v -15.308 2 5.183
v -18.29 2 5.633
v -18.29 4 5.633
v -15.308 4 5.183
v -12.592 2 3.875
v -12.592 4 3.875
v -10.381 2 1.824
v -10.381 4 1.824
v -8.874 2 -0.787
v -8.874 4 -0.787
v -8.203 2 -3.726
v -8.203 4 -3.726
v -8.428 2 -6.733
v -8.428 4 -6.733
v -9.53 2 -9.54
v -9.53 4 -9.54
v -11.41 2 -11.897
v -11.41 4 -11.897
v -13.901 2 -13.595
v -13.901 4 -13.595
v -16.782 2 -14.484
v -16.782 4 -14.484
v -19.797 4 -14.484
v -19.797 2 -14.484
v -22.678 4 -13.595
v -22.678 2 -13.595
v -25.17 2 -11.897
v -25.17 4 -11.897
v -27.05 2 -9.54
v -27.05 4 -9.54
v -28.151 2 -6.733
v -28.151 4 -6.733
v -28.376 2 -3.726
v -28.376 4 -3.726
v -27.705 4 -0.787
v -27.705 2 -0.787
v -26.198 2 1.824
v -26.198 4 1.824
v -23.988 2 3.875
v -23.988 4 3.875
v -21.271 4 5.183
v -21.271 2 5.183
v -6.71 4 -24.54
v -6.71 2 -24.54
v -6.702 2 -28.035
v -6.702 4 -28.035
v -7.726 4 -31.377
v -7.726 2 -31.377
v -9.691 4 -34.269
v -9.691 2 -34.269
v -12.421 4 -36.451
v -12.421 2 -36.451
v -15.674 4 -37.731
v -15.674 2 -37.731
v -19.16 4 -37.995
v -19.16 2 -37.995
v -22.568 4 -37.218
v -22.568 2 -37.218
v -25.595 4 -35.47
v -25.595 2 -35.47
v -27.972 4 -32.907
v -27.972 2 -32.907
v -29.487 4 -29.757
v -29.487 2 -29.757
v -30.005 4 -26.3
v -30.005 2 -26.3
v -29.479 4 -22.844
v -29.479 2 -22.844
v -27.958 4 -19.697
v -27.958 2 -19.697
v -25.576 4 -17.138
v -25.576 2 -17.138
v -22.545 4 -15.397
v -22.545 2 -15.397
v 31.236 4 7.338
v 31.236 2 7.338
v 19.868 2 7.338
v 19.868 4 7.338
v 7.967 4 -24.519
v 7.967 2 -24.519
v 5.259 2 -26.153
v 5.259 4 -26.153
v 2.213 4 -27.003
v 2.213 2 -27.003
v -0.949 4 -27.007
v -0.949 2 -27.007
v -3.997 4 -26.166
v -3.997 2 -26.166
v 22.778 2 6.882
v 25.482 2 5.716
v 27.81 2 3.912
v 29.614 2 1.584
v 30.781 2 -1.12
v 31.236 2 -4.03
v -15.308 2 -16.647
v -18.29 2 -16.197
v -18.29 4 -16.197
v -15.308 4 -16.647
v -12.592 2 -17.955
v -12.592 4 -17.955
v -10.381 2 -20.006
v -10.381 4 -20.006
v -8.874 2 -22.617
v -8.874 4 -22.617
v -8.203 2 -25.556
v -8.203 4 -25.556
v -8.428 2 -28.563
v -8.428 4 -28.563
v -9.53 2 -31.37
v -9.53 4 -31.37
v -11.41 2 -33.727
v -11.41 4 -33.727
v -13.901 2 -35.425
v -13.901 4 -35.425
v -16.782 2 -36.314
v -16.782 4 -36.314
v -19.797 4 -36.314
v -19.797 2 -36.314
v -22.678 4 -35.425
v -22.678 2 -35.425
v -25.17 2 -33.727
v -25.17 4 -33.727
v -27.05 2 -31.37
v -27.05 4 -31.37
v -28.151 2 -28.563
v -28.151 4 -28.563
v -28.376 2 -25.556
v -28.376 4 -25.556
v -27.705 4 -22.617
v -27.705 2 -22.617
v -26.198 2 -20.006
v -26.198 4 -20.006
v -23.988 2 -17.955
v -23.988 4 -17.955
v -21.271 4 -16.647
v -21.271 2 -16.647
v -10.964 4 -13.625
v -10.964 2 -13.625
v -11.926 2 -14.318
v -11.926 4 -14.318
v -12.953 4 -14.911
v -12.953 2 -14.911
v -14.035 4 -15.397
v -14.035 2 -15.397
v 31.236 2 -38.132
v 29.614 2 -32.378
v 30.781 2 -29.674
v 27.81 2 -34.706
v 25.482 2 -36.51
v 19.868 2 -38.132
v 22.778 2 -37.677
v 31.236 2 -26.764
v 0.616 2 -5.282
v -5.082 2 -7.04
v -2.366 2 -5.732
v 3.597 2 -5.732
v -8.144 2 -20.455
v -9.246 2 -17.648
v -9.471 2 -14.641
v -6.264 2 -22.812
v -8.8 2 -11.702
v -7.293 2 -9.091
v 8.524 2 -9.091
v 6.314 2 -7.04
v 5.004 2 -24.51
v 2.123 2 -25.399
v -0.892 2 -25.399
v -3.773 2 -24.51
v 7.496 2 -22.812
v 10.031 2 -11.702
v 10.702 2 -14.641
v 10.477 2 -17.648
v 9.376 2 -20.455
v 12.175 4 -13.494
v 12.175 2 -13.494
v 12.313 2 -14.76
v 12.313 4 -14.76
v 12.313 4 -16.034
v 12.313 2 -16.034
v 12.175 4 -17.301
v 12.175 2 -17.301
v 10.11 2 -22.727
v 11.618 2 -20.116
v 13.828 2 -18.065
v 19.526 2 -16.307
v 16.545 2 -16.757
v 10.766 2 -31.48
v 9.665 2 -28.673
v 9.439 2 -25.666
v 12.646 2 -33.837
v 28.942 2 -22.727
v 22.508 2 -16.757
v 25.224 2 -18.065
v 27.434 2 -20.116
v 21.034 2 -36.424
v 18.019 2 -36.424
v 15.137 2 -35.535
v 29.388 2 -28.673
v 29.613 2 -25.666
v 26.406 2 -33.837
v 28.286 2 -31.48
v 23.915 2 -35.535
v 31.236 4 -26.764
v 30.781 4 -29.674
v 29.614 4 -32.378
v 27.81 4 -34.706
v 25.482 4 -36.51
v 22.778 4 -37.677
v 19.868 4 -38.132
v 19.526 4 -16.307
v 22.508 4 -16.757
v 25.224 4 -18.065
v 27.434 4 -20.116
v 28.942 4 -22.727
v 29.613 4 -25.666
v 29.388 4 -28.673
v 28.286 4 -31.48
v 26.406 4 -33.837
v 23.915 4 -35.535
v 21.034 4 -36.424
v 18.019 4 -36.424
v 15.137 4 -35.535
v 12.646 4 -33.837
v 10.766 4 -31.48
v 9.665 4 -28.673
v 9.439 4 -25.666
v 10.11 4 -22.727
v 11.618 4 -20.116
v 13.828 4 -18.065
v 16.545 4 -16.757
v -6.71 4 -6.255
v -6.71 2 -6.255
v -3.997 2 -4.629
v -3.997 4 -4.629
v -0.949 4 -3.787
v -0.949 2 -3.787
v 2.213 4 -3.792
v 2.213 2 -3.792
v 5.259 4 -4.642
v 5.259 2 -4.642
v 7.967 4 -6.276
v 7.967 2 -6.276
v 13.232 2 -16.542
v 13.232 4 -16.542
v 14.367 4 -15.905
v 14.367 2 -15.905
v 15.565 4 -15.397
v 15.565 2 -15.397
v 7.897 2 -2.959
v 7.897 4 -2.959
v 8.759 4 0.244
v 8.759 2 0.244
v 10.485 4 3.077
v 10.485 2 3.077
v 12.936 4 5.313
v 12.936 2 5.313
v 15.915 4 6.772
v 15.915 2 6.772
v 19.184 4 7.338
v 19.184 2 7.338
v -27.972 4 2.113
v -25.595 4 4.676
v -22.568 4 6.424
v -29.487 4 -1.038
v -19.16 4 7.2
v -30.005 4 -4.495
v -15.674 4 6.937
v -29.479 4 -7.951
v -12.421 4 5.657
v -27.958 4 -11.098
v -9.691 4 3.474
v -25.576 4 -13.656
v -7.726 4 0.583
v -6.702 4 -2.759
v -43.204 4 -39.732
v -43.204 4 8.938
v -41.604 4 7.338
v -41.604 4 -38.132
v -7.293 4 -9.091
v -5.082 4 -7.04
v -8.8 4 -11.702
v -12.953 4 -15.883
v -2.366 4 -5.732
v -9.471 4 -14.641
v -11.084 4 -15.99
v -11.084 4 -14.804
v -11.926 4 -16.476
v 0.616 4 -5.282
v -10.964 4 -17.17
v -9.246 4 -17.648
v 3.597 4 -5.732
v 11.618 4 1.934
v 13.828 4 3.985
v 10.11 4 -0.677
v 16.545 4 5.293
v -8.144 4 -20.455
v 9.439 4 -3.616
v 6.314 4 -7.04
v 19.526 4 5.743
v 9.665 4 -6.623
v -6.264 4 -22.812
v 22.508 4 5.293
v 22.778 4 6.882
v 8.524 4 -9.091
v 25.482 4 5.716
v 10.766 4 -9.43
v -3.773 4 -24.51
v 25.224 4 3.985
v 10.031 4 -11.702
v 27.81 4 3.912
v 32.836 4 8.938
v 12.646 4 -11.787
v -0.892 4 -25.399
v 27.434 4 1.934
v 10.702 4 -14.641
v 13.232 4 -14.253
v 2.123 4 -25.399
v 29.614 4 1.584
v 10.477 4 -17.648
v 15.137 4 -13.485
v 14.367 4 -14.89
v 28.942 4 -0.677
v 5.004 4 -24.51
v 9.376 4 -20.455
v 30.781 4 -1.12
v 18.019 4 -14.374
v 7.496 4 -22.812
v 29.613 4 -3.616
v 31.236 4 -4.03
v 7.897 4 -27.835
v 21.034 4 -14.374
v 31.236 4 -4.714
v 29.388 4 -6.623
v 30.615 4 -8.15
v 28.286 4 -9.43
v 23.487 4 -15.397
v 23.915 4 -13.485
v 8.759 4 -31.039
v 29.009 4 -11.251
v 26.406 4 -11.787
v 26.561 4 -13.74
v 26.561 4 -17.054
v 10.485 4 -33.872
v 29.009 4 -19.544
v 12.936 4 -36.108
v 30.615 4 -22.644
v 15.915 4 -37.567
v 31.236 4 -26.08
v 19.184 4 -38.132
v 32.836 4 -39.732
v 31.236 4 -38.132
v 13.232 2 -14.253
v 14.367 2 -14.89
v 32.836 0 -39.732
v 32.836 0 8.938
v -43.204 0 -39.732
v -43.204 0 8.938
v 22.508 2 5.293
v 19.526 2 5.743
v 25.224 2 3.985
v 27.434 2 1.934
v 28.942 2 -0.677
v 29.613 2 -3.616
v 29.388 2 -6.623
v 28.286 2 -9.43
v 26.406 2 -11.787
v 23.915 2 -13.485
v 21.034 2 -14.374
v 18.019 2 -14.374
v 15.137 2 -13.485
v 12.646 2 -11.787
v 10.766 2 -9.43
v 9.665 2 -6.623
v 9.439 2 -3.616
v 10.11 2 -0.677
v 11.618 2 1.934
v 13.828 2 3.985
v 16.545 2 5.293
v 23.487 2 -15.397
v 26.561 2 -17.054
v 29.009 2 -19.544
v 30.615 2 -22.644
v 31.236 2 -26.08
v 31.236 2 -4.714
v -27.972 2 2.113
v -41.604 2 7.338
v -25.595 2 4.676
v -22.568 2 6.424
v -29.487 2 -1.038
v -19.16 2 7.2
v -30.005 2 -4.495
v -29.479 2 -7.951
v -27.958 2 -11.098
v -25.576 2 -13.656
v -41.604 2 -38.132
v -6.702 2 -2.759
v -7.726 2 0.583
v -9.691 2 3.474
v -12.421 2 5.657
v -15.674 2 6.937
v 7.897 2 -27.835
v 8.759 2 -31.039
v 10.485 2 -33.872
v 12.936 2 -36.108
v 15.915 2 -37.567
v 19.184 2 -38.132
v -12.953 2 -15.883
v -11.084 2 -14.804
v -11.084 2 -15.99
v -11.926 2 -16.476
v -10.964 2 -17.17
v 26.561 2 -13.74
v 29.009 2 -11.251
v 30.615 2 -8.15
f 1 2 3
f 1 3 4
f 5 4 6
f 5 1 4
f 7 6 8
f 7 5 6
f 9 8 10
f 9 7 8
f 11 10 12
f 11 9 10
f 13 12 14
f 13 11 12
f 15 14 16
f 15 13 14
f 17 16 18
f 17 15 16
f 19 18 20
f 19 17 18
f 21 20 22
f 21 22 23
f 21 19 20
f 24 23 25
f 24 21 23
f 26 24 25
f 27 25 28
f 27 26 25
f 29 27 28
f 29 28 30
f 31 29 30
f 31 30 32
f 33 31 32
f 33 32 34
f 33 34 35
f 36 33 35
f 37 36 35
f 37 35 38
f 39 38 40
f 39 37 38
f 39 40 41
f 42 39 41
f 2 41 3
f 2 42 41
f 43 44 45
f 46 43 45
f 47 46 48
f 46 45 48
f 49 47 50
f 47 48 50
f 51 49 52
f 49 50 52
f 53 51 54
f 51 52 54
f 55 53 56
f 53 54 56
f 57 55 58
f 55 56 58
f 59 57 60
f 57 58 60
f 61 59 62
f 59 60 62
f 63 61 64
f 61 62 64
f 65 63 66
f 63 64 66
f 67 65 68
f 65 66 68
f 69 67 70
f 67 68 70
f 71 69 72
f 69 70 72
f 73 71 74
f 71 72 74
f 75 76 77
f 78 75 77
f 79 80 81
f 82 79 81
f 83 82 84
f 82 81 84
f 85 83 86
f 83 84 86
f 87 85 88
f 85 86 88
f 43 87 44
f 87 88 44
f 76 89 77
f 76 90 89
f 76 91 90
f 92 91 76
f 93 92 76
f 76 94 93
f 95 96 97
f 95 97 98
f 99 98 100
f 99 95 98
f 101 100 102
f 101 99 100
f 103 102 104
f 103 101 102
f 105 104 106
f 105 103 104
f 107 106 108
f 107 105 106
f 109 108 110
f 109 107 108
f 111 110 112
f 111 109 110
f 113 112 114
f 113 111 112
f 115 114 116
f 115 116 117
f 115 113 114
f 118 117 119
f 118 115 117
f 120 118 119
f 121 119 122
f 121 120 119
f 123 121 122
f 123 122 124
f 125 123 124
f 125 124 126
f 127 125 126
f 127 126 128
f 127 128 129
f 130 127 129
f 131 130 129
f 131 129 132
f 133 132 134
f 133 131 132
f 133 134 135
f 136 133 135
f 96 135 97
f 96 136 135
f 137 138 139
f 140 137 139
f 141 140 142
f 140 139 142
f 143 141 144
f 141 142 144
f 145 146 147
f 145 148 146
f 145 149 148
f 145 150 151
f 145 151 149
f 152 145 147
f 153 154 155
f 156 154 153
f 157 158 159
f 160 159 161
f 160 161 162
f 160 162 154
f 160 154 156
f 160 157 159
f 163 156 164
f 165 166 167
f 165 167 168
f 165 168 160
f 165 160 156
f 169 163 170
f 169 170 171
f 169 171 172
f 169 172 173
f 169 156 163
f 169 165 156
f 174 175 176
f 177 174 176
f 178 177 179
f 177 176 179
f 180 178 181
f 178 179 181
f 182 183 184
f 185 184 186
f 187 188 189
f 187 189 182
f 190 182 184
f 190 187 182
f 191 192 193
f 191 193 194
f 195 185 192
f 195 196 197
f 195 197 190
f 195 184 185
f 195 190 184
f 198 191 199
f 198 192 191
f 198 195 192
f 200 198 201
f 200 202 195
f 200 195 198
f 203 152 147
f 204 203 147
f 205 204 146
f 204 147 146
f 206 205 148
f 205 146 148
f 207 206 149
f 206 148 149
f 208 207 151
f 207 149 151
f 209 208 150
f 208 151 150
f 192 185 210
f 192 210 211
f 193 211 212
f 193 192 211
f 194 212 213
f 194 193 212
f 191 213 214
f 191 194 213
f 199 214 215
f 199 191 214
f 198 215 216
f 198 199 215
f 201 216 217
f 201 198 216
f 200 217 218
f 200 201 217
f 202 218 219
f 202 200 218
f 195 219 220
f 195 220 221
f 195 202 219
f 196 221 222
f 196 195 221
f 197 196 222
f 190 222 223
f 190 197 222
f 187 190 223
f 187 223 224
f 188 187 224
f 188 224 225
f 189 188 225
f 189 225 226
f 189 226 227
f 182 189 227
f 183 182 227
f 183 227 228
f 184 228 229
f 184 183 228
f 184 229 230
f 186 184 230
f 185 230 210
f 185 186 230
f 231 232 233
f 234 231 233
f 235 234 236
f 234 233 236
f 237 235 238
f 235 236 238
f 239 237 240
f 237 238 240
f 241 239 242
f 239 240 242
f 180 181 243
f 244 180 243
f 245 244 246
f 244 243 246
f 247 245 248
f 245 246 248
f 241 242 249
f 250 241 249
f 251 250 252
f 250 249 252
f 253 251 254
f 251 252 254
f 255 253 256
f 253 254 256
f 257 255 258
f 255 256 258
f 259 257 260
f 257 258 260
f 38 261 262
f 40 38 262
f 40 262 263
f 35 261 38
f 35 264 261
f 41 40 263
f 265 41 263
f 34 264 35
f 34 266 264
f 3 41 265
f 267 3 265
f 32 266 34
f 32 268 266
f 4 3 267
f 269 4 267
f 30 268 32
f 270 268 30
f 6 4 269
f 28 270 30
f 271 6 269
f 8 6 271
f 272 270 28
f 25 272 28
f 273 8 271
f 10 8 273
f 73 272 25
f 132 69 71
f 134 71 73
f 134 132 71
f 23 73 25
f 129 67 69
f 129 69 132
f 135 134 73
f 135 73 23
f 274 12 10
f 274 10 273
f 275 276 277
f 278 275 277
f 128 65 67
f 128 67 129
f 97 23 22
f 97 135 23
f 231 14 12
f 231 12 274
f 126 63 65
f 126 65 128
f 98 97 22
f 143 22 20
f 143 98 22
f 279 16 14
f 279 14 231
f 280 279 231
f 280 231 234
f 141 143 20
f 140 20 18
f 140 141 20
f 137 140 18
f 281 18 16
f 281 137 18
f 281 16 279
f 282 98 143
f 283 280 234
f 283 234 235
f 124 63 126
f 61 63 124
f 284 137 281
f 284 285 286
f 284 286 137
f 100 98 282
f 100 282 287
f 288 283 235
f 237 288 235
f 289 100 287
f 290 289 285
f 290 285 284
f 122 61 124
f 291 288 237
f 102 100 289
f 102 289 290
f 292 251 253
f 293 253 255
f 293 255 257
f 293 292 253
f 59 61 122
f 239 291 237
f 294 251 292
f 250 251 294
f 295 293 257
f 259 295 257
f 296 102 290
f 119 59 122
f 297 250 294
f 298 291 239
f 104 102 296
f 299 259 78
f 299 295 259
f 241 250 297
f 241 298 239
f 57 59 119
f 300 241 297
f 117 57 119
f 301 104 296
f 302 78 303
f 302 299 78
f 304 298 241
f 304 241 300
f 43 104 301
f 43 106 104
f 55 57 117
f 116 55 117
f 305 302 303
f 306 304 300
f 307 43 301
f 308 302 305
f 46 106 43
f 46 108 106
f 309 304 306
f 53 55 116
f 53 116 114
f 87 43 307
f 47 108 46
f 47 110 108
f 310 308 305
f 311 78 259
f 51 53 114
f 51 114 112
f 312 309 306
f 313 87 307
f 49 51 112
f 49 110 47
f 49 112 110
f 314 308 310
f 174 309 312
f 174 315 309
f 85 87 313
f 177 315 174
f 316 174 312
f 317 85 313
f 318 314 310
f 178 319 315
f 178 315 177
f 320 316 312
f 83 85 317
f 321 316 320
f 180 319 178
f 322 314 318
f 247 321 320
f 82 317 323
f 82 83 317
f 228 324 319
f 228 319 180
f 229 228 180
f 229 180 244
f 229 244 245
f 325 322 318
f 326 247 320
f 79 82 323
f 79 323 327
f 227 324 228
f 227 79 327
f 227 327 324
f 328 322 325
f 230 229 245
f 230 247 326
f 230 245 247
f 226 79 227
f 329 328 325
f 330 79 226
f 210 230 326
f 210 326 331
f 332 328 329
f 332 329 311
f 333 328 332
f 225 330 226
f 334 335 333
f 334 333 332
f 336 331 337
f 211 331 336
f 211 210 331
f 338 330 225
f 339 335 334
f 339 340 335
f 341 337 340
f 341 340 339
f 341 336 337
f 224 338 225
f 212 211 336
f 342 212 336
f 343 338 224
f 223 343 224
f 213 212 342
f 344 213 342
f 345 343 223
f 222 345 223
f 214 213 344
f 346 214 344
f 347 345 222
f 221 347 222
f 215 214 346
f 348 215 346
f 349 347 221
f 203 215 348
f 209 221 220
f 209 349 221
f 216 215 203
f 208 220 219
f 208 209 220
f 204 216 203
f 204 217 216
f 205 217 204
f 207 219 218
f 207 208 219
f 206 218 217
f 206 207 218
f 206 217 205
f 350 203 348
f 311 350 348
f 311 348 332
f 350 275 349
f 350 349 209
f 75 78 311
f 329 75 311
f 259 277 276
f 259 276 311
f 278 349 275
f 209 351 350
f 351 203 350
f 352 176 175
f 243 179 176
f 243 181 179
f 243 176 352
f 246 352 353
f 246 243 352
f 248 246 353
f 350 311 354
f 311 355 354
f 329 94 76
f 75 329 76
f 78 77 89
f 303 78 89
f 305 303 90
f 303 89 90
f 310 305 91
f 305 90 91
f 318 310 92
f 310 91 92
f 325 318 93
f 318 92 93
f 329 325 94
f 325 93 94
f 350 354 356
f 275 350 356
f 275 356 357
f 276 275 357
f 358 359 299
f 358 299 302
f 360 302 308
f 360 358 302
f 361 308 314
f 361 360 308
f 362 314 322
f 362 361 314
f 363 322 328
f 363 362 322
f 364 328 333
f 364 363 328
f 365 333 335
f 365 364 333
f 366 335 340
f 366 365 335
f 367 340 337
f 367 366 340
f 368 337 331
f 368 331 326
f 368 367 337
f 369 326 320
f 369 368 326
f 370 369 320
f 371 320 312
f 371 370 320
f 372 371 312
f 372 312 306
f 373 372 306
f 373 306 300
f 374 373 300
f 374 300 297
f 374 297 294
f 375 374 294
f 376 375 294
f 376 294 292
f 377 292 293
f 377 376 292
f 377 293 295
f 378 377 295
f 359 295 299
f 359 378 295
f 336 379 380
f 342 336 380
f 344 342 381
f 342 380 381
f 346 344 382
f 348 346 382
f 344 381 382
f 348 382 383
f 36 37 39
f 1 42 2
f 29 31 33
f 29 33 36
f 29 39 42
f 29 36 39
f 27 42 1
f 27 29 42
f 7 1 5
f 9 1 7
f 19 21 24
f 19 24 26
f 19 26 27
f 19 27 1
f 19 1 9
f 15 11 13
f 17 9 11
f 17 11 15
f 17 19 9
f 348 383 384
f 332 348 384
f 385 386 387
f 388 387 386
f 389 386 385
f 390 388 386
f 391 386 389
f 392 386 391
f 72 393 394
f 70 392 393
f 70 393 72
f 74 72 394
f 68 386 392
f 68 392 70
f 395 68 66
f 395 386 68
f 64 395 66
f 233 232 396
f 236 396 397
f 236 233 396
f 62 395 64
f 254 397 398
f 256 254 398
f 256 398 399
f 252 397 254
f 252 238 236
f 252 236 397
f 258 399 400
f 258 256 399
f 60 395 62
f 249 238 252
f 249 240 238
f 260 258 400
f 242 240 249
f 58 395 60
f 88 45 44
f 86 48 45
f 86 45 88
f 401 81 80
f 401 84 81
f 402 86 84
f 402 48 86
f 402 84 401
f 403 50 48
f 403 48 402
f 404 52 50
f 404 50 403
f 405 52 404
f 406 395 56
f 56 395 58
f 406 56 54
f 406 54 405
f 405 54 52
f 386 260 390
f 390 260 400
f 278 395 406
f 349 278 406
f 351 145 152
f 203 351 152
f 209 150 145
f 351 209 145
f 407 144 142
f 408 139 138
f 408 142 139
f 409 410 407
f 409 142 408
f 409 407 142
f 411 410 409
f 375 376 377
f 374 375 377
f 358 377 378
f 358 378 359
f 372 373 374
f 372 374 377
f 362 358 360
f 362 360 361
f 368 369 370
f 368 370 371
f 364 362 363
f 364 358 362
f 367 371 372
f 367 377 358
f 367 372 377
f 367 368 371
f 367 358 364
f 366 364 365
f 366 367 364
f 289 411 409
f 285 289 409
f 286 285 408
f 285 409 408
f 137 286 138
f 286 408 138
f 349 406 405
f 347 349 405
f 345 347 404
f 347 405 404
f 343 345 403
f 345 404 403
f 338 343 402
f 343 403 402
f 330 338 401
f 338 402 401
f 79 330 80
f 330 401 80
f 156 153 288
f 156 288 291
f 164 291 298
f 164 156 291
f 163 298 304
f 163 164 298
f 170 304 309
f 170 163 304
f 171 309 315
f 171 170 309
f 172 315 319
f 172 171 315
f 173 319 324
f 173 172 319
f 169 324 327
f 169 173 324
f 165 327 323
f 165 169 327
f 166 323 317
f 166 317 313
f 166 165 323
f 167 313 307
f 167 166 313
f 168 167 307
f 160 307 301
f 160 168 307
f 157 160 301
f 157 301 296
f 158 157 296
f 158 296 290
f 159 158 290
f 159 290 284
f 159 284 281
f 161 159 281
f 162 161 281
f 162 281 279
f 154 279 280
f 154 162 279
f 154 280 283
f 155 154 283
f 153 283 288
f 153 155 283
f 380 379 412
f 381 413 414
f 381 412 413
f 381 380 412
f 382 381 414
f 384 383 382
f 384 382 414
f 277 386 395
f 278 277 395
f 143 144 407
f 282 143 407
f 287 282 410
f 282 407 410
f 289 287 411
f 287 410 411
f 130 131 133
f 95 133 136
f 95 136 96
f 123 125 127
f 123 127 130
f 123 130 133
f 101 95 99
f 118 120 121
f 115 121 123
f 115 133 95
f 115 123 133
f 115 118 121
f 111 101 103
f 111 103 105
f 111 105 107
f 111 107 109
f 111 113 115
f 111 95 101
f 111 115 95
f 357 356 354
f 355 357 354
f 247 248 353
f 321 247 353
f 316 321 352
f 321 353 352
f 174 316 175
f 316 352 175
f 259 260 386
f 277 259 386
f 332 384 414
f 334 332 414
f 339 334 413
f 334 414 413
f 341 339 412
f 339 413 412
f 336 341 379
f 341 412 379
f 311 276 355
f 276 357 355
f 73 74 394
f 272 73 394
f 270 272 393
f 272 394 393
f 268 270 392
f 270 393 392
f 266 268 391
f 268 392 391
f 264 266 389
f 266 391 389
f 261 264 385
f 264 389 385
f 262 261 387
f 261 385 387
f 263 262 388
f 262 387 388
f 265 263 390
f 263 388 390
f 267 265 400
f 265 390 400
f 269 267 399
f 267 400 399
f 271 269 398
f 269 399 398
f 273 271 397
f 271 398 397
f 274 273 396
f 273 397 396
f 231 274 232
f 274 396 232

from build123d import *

# Parameters (mm, degrees)
SKETCH1_W           = 76.04
SKETCH1_H           = 48.67
BOSS_EXTRUDE1_DEPTH = 2
SKETCH2_R           = 10.115
BOSS_EXTRUDE5_DEPTH = 2
BOSS_EXTRUDE6_DEPTH = 2


with BuildPart() as part:
    # Sketch1 → Boss-Extrude1 (new body)
    with BuildSketch(Plane(origin=(0, 0, 0), x_dir=(1, 0, 0), z_dir=(0, 1, 0))):
        with Locations((-5.18381875, 15.397172461)):
            Rectangle(SKETCH1_W, SKETCH1_H)
    extrude(amount=BOSS_EXTRUDE1_DEPTH)

    # Sketch2 → Boss-Extrude5 (add)
    with BuildSketch(Plane(origin=(0, 2, 0), x_dir=(1, 0, 0), z_dir=(0, 1, 0))):
        with BuildLine():
            ThreePointArc((7.966863666, 24.51864889), (0.632329313, 27.112160631), (-6.709546926, 24.539506243))
            ThreePointArc((-6.709546926, 24.539506243), (-24.147153985, 36.457660066), (-22.544533536, 15.397172461))
            ThreePointArc((-22.544533536, 15.397172461), (-24.147153985, -5.663315144), (-6.709546926, 6.254838679))
            ThreePointArc((-6.709546926, 6.254838679), (0.632329313, 3.682184291), (7.966863666, 6.275696032))
            ThreePointArc((7.966863666, 6.275696032), (10.484956429, -3.077490534), (19.183945951, -7.337827539))
            Line((19.183945951, -7.337827539), (19.868416549, -7.337827539))
            ThreePointArc((19.868416549, -7.337827539), (27.809937192, -3.911583481), (31.23618125, 4.029937162))
            Line((31.23618125, 4.029937162), (31.23618125, 4.71440776))
            ThreePointArc((31.23618125, 4.71440776), (29.009139273, 11.250742962), (23.487317451, 15.397172461))
            ThreePointArc((23.487317451, 15.397172461), (29.009139273, 19.54360196), (31.23618125, 26.079937162))
            Line((31.23618125, 26.079937162), (31.23618125, 26.76440776))
            ThreePointArc((31.23618125, 26.76440776), (27.809937192, 34.705928403), (19.868416549, 38.132172461))
            Line((19.868416549, 38.132172461), (19.183945951, 38.132172461))
            ThreePointArc((19.183945951, 38.132172461), (10.484956429, 33.871835456), (7.966863666, 24.51864889))
        make_face()
        with Locations(Location((-18.289653985, 4.482172461, 0), (0, 0, 270))):
            Circle(SKETCH2_R, mode=Mode.SUBTRACT)
        with Locations(Location((0.61568058, 15.397172461, 0), (0, 0, 270))):
            Circle(SKETCH2_R, mode=Mode.SUBTRACT)
        with Locations(Location((19.52618125, 4.372172461, 0), (0, 0, 270))):
            Circle(SKETCH2_R, mode=Mode.SUBTRACT)
        with Locations(Location((-18.289653985, 26.312172461, 0), (0, 0, 270))):
            Circle(SKETCH2_R, mode=Mode.SUBTRACT)
        with BuildLine():
            ThreePointArc((-10.964426478, 17.169838679), (-11.09931942, 15.397172461), (-10.964426478, 13.624506243))
            ThreePointArc((-10.964426478, 13.624506243), (-12.432153985, 14.627660066), (-14.034774433, 15.397172461))
            ThreePointArc((-14.034774433, 15.397172461), (-12.432153985, 16.166684856), (-10.964426478, 17.169838679))
        make_face(mode=Mode.SUBTRACT)
        with BuildLine():
            ThreePointArc((12.174998164, 13.49364889), (12.33068058, 15.397172461), (12.174998164, 17.300696032))
            ThreePointArc((12.174998164, 17.300696032), (13.790504097, 16.207318933), (15.565045049, 15.397172461))
            ThreePointArc((15.565045049, 15.397172461), (13.790504097, 14.587025989), (12.174998164, 13.49364889))
        make_face(mode=Mode.SUBTRACT)
        with Locations(Location((19.52618125, 26.422172461, 0), (0, 0, 270))):
            Circle(SKETCH2_R, mode=Mode.SUBTRACT)
    extrude(amount=BOSS_EXTRUDE5_DEPTH)

    # Sketch3 → Boss-Extrude6 (add)
    with BuildSketch(Plane(origin=(0, 2, 0), x_dir=(1, 0, 0), z_dir=(0, 1, 0))):
        Polygon((-41.60381875, 39.732172461), (-43.20381875, 39.732172461), (-43.20381875, -8.937827539), (31.23618125, -8.937827539), (32.83618125, -8.937827539), (32.83618125, 39.732172461), align=None)
        Polygon((-41.60381875, -7.337827539), (-41.60381875, 38.132172461), (19.183945951, 38.132172461), (19.868416549, 38.132172461), (31.23618125, 38.132172461), (31.23618125, 26.76440776), (31.23618125, 26.079937162), (31.23618125, 4.71440776), (31.23618125, 4.029937162), (31.23618125, -7.337827539), (19.868416549, -7.337827539), (19.183945951, -7.337827539), align=None, mode=Mode.SUBTRACT)
    extrude(amount=BOSS_EXTRUDE6_DEPTH)


solid = part.part
